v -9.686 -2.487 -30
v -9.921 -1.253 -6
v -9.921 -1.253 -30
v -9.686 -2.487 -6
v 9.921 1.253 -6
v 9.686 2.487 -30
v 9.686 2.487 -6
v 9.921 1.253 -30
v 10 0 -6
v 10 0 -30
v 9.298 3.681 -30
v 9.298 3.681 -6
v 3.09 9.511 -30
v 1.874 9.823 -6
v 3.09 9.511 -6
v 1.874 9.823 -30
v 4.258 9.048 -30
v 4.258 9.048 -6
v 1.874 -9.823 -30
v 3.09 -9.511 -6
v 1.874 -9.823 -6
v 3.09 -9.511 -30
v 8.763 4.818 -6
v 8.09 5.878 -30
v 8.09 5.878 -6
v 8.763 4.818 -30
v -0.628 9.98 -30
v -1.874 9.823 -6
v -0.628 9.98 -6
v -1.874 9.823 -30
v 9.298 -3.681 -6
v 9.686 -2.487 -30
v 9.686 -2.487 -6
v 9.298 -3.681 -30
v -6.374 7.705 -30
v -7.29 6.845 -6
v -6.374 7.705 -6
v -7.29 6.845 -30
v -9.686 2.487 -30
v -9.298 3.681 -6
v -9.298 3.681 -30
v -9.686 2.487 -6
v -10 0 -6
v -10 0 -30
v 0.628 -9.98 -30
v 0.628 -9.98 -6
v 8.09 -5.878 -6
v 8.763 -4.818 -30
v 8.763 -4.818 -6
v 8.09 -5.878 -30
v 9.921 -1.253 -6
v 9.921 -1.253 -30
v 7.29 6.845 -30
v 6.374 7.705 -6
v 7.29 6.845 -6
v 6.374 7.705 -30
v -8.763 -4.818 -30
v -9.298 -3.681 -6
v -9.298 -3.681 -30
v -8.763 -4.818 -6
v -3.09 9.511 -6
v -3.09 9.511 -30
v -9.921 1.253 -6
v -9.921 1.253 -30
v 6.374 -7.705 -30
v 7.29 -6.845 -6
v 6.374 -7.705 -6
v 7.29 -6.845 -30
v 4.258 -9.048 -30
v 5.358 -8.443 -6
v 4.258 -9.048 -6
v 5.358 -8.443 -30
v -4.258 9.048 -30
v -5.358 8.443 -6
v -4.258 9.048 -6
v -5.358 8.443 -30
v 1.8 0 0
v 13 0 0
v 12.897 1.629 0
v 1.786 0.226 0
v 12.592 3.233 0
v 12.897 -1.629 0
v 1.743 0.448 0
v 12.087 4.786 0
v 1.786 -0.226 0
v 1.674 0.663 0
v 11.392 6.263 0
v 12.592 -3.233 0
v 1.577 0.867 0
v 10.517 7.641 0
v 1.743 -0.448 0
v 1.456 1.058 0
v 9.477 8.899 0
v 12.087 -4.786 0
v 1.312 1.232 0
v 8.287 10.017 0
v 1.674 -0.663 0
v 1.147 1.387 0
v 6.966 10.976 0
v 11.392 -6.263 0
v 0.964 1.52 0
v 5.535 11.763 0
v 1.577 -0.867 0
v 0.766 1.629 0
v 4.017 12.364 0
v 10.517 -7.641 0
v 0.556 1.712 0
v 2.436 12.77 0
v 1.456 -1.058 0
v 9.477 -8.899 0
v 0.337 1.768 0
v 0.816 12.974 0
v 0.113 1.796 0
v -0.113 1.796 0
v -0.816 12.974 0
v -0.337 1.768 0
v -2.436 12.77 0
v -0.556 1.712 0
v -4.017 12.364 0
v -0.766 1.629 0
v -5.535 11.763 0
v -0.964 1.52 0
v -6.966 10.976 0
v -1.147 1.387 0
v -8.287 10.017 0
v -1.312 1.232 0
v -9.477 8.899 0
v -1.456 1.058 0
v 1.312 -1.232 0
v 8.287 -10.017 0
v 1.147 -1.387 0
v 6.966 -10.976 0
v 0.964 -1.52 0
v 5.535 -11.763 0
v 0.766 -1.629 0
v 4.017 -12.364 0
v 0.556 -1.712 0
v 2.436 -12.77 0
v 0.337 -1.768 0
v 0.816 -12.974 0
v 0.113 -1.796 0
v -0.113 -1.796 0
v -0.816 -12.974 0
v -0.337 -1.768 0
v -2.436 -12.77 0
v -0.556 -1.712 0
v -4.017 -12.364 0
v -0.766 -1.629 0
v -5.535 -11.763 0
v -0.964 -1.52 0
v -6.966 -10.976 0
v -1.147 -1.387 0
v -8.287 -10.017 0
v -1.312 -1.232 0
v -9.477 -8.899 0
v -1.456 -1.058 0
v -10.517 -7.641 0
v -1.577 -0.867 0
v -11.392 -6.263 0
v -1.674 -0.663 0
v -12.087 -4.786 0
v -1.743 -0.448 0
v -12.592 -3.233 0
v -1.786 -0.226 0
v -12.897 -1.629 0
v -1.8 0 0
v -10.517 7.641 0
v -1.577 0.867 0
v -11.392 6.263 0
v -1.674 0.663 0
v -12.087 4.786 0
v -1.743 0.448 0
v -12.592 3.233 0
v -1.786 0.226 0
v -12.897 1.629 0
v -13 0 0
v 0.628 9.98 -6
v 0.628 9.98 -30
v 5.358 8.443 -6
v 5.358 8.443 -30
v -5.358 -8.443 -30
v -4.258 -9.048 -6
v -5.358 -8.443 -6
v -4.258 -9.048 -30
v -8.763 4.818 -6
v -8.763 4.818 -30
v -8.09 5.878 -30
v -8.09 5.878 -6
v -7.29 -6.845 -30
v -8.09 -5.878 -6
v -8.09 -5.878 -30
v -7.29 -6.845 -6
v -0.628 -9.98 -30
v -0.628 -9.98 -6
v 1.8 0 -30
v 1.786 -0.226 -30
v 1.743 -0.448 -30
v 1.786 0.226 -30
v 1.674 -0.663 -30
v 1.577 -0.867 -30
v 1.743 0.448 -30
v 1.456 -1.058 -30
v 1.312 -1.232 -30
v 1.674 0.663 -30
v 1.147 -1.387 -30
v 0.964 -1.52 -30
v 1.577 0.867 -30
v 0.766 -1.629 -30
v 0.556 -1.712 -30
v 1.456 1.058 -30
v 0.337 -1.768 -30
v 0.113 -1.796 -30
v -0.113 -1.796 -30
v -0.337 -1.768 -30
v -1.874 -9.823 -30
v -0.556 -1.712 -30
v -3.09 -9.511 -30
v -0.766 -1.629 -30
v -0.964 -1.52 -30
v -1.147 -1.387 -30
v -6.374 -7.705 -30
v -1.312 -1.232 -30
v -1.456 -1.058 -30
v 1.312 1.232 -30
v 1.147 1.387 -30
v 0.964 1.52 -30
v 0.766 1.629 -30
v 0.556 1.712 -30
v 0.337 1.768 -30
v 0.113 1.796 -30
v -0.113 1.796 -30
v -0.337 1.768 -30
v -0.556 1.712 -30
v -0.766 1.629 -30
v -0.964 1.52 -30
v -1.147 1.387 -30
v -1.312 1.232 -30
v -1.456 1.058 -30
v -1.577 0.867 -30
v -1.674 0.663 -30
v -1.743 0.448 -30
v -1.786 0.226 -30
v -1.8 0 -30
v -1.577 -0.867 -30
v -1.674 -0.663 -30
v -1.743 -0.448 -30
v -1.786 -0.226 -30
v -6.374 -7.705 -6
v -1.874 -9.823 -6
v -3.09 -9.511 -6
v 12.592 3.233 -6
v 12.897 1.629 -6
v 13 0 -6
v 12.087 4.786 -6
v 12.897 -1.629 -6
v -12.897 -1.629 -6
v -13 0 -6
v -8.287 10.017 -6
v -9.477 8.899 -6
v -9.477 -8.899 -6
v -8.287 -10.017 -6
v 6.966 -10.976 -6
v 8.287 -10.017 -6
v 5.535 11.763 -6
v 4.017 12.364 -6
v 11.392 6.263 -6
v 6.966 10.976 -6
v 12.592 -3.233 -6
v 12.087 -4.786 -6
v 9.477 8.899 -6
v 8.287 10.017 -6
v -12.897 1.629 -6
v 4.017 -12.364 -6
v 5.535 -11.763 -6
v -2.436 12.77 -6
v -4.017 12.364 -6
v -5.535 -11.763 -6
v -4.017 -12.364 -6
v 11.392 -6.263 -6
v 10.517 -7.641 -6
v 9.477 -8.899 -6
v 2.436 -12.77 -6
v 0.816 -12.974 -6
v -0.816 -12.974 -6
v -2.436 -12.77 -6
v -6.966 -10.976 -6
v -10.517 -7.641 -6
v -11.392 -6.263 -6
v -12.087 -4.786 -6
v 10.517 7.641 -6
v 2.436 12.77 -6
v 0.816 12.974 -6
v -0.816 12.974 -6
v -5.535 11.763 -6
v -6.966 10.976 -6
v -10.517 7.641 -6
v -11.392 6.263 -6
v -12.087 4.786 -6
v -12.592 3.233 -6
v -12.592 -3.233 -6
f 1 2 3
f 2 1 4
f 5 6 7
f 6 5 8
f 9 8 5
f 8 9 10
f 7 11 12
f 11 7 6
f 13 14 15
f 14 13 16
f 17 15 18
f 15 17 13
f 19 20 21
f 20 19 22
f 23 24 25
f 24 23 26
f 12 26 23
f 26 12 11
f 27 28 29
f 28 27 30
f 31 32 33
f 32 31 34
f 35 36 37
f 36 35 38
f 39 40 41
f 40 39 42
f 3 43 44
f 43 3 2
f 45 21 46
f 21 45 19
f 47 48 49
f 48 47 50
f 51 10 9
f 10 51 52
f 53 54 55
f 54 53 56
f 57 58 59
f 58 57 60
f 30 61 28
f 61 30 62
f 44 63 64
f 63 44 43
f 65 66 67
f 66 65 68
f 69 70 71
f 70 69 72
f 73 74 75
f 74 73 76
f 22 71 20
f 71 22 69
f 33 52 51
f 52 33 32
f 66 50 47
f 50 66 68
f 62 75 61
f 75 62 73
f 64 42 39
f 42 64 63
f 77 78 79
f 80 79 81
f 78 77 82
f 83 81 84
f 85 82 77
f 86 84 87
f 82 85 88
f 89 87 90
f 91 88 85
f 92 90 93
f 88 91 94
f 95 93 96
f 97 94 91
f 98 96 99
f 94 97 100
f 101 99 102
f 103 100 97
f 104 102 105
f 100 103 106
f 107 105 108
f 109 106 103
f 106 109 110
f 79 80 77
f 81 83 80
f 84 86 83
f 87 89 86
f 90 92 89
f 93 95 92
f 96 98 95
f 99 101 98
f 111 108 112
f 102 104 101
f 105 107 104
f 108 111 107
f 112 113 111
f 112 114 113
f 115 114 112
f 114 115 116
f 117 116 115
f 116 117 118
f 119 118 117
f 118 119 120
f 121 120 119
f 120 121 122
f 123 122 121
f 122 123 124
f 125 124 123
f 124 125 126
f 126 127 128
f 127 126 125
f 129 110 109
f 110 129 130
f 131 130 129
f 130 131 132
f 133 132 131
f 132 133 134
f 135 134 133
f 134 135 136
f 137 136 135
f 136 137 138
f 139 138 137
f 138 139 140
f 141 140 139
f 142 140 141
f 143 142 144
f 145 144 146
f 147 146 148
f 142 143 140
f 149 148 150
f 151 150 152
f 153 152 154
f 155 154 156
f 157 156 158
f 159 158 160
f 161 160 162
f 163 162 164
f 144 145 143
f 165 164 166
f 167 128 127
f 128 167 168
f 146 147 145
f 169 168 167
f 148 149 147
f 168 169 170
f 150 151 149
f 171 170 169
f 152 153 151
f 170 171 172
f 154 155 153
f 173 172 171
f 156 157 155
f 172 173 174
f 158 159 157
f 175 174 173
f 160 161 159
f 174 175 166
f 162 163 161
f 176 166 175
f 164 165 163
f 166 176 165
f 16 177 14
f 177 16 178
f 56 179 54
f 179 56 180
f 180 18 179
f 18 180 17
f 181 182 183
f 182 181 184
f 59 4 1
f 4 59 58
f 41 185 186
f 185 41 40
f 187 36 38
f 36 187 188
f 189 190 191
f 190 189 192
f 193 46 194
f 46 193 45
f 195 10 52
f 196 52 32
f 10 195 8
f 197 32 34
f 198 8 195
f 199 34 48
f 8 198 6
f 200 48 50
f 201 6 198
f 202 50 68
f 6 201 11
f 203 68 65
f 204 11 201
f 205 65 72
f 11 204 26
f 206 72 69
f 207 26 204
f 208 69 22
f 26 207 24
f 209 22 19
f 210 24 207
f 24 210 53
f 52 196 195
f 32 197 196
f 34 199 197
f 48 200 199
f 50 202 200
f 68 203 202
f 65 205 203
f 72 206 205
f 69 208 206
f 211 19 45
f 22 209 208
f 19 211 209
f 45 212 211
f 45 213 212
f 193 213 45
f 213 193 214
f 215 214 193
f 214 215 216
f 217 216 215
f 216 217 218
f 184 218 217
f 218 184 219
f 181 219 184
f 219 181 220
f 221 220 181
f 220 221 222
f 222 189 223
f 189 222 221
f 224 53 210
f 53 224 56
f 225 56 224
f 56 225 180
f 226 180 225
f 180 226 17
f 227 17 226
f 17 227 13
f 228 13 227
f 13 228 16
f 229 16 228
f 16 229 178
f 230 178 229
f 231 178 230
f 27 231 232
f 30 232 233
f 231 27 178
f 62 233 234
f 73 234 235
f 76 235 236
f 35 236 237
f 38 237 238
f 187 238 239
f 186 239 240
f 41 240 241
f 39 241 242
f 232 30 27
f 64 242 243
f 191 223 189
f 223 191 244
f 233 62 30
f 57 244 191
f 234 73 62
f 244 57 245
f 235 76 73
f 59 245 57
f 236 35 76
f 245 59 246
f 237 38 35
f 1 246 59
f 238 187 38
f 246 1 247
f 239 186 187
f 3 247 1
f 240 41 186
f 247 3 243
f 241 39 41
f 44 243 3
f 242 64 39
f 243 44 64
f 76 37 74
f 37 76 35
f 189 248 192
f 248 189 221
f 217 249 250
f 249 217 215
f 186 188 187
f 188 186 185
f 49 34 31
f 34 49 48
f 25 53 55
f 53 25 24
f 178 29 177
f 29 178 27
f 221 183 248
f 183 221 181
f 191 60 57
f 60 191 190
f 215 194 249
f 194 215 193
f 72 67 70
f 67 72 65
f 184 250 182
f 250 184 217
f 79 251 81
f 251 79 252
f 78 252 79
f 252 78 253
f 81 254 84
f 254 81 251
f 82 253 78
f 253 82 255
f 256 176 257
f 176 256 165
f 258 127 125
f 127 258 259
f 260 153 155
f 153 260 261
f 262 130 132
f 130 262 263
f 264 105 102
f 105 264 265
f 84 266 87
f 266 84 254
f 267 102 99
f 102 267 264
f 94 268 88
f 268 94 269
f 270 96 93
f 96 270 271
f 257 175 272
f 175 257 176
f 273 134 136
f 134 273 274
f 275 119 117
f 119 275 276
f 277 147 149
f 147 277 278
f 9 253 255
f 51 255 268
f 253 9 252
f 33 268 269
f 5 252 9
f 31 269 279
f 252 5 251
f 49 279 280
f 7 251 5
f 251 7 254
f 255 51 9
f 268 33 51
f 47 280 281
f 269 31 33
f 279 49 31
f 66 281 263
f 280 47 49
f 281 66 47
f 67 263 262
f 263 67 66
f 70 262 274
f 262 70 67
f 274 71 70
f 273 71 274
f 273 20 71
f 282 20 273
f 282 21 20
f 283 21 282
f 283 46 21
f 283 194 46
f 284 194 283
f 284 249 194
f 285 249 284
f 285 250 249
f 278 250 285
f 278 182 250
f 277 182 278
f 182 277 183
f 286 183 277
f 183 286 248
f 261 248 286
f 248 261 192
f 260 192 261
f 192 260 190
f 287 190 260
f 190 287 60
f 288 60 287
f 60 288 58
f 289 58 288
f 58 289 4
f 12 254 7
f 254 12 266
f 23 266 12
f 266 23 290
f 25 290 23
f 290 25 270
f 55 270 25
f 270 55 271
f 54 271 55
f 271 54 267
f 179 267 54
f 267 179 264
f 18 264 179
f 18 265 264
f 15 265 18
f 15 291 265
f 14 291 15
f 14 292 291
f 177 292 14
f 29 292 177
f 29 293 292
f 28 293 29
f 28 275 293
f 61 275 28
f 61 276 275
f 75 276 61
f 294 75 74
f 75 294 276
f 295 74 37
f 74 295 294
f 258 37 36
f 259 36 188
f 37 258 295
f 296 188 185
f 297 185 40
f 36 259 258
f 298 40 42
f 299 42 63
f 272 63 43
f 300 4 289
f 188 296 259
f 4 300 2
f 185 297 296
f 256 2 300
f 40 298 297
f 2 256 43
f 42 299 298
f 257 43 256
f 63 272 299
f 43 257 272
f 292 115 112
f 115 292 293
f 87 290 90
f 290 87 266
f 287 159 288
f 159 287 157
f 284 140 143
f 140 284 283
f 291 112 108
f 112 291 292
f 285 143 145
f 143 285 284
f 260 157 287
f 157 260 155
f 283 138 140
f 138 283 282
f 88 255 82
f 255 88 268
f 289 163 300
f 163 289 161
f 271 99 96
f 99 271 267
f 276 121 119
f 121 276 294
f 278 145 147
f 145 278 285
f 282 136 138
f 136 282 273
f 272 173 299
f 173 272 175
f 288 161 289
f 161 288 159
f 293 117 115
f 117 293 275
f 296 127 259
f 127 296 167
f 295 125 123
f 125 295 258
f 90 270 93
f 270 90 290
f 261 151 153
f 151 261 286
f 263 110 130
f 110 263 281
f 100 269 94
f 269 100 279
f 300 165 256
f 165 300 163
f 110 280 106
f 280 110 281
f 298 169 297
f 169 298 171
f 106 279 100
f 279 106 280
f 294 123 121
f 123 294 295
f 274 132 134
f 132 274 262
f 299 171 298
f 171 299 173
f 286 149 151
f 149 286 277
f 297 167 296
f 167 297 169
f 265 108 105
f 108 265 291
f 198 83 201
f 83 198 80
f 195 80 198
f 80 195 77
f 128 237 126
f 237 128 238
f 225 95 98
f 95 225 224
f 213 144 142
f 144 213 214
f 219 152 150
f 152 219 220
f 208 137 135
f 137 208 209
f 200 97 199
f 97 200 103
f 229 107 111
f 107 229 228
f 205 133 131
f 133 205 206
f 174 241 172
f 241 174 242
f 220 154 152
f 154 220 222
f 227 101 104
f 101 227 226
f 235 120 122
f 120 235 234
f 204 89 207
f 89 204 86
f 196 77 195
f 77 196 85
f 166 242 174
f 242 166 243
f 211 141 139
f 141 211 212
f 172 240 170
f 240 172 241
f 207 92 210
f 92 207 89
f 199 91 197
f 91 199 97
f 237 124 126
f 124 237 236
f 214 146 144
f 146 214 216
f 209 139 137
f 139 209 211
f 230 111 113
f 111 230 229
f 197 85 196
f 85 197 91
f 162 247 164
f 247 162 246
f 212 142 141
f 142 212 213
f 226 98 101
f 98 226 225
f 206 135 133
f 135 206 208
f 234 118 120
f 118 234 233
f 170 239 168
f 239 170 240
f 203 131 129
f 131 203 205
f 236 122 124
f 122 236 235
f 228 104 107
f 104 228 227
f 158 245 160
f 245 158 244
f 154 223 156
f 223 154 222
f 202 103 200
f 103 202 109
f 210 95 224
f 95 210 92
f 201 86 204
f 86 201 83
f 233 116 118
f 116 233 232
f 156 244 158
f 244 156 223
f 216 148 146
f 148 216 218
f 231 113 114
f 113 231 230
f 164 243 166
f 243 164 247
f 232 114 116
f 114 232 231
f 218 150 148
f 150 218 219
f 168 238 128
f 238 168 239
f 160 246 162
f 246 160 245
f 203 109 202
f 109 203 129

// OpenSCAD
$fn = 50;


difference() {
	union() {
		translate(v = [0, 0, -30.0000000000]) {
			cylinder(h = 30, r = 10.0000000000);
		}
		translate(v = [0, 0, -6.0000000000]) {
			cylinder(h = 6, r = 13.0000000000);
		}
	}
	union() {
		#translate(v = [0, 0, -30]) {
			cylinder(h = 30, r = 1.8000000000);
		}
	}
}
